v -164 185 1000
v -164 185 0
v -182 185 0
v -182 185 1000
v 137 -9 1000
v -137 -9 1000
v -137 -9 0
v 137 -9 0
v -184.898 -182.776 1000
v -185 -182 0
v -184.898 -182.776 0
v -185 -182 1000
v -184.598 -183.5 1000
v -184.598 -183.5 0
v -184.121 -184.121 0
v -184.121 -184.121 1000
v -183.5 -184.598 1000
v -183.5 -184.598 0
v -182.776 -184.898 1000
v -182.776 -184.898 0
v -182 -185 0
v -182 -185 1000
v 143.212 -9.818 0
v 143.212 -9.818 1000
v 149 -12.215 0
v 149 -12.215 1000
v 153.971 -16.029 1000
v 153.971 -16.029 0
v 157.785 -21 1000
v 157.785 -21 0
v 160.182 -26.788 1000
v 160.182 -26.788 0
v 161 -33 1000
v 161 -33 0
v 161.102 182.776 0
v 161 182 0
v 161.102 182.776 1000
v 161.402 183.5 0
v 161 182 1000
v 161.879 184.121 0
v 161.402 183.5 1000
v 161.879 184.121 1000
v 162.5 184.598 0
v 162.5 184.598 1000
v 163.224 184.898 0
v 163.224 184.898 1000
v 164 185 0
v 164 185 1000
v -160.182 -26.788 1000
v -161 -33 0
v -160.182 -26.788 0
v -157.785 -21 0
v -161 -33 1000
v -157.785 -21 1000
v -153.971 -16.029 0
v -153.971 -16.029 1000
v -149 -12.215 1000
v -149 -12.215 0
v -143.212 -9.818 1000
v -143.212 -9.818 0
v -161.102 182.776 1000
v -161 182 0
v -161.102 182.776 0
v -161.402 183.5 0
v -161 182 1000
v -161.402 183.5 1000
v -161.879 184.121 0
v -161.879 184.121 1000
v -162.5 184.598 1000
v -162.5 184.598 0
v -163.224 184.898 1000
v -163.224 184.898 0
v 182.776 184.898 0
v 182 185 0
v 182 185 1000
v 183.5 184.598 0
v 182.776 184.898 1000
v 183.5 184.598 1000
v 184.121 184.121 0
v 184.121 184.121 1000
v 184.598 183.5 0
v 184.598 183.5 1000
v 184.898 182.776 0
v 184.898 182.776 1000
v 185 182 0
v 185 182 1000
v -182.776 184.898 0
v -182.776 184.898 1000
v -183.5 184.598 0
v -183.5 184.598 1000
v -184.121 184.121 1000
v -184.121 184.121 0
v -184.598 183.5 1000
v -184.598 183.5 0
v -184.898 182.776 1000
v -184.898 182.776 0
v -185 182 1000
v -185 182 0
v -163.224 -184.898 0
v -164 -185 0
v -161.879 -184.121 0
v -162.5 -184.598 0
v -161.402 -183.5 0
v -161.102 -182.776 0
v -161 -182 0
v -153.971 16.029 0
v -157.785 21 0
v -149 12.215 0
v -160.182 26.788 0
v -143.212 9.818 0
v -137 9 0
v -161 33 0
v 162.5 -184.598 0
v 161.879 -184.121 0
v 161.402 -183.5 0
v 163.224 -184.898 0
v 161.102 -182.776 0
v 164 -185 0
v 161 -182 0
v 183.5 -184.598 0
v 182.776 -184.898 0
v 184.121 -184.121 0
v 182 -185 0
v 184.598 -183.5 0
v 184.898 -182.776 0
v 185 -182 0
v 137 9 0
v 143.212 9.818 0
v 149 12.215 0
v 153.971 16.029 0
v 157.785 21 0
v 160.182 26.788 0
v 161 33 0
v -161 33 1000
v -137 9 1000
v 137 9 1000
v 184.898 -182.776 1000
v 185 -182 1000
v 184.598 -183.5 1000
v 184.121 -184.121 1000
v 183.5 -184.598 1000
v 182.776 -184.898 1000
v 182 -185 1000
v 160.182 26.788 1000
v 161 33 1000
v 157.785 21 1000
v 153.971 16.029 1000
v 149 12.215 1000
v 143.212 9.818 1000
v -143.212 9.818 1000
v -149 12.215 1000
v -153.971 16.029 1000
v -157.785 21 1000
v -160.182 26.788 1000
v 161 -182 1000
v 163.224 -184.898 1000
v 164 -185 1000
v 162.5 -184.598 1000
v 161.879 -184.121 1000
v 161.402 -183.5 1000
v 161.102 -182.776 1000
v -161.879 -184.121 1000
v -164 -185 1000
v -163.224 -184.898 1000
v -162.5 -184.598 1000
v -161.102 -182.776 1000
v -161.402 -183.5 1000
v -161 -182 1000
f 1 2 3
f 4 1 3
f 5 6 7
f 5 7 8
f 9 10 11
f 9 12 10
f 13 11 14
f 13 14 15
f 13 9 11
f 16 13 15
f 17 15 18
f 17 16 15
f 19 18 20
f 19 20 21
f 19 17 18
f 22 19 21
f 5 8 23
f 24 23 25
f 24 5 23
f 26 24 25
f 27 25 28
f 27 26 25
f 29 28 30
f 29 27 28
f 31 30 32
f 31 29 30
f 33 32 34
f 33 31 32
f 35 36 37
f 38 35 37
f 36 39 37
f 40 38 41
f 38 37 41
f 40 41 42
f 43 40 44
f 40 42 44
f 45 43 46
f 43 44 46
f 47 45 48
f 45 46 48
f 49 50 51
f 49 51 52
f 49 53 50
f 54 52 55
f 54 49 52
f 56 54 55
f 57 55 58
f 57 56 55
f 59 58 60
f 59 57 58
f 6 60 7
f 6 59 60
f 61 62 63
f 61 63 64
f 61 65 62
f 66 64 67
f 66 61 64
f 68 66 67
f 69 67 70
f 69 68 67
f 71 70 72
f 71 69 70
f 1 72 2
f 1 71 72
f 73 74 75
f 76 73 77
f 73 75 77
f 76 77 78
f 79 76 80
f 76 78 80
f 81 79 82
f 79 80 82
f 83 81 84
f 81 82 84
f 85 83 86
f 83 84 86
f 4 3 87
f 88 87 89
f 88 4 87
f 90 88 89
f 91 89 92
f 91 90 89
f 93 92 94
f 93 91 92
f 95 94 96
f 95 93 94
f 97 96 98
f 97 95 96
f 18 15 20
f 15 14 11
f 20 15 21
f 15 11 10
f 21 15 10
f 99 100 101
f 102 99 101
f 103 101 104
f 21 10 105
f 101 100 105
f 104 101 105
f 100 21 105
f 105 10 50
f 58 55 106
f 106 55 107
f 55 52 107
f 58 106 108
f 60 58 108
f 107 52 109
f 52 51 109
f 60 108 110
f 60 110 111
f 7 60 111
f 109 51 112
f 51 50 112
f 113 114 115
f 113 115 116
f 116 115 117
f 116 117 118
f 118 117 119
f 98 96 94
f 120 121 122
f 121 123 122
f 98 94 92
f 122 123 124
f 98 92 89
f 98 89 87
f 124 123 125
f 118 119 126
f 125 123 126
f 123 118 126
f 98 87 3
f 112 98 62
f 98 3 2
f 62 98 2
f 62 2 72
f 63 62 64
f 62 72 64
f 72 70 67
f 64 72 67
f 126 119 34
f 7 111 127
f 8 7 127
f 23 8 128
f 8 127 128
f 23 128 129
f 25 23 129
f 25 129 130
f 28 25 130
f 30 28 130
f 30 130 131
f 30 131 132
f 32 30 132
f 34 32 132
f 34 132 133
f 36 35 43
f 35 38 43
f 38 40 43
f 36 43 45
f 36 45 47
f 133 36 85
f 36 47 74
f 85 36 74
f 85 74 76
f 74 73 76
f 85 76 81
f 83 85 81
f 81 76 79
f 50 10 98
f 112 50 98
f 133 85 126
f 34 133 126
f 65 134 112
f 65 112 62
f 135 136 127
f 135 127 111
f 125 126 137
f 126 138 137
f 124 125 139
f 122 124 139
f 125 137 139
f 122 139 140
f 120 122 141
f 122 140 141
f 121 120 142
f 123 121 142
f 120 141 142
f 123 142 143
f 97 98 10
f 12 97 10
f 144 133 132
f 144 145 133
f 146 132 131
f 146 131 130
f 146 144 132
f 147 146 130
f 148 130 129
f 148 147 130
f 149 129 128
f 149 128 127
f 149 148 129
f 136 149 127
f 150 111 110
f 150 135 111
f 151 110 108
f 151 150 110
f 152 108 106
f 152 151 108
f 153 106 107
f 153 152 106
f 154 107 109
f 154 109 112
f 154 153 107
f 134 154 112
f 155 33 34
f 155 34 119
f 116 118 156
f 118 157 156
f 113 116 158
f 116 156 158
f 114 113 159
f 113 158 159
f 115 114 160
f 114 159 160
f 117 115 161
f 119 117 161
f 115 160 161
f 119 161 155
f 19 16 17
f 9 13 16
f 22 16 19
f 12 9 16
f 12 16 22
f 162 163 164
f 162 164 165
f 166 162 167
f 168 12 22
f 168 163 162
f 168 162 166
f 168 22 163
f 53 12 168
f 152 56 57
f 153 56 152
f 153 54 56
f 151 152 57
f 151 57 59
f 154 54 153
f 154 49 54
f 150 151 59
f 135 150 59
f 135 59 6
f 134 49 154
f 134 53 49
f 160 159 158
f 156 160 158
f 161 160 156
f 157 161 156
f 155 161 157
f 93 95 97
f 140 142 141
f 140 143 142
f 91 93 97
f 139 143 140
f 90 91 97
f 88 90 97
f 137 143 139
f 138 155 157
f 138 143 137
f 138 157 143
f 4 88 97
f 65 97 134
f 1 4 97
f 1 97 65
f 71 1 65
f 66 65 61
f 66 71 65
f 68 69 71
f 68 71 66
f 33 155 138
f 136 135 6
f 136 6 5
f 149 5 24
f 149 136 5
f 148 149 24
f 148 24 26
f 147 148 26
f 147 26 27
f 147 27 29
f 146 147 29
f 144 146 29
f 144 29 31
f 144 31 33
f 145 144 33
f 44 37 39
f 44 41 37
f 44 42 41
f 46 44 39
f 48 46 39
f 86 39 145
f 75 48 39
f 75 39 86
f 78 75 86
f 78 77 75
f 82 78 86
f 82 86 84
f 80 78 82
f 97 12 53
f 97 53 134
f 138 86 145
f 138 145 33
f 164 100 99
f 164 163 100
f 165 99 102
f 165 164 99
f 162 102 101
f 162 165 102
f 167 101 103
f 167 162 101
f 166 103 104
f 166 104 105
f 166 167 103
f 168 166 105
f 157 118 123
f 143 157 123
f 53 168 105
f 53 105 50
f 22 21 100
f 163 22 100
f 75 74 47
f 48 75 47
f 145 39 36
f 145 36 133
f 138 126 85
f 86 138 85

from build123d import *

# Parameters (mm, degrees)
F1_DEPTH = 1000
F2_R     = 24
F3_R     = 3


with BuildPart() as f1:
    # F0 (on Top) → F1 (new body)
    with BuildSketch(Plane.XY):
        Polygon((185, -185), (185, 185), (161, 185), (161, 9), (-161, 9), (-161, 185), (-185, 185), (-185, -185), (-161, -185), (-161, -9), (161, -9), (161, -185), align=None)
    extrude(amount=F1_DEPTH)

    # F2
    f2_edges = [f1.edges().sort_by_distance(p)[0] for p in [
        (-161, -9, 500),
        (161, -9, 500),
        (161, 9, 500),
        (-161, 9, 500),
    ]]
    fillet(f2_edges, radius=F2_R)

    # F3
    f3_edges = [f1.edges().sort_by_distance(p)[0] for p in [
        (161, 185, 500),
        (185, 185, 500),
        (-161, 185, 500),
        (-185, 185, 500),
        (185, -185, 500),
        (161, -185, 500),
        (-185, -185, 500),
        (-161, -185, 500),
    ]]
    fillet(f3_edges, radius=F3_R)


solid = f1.part
